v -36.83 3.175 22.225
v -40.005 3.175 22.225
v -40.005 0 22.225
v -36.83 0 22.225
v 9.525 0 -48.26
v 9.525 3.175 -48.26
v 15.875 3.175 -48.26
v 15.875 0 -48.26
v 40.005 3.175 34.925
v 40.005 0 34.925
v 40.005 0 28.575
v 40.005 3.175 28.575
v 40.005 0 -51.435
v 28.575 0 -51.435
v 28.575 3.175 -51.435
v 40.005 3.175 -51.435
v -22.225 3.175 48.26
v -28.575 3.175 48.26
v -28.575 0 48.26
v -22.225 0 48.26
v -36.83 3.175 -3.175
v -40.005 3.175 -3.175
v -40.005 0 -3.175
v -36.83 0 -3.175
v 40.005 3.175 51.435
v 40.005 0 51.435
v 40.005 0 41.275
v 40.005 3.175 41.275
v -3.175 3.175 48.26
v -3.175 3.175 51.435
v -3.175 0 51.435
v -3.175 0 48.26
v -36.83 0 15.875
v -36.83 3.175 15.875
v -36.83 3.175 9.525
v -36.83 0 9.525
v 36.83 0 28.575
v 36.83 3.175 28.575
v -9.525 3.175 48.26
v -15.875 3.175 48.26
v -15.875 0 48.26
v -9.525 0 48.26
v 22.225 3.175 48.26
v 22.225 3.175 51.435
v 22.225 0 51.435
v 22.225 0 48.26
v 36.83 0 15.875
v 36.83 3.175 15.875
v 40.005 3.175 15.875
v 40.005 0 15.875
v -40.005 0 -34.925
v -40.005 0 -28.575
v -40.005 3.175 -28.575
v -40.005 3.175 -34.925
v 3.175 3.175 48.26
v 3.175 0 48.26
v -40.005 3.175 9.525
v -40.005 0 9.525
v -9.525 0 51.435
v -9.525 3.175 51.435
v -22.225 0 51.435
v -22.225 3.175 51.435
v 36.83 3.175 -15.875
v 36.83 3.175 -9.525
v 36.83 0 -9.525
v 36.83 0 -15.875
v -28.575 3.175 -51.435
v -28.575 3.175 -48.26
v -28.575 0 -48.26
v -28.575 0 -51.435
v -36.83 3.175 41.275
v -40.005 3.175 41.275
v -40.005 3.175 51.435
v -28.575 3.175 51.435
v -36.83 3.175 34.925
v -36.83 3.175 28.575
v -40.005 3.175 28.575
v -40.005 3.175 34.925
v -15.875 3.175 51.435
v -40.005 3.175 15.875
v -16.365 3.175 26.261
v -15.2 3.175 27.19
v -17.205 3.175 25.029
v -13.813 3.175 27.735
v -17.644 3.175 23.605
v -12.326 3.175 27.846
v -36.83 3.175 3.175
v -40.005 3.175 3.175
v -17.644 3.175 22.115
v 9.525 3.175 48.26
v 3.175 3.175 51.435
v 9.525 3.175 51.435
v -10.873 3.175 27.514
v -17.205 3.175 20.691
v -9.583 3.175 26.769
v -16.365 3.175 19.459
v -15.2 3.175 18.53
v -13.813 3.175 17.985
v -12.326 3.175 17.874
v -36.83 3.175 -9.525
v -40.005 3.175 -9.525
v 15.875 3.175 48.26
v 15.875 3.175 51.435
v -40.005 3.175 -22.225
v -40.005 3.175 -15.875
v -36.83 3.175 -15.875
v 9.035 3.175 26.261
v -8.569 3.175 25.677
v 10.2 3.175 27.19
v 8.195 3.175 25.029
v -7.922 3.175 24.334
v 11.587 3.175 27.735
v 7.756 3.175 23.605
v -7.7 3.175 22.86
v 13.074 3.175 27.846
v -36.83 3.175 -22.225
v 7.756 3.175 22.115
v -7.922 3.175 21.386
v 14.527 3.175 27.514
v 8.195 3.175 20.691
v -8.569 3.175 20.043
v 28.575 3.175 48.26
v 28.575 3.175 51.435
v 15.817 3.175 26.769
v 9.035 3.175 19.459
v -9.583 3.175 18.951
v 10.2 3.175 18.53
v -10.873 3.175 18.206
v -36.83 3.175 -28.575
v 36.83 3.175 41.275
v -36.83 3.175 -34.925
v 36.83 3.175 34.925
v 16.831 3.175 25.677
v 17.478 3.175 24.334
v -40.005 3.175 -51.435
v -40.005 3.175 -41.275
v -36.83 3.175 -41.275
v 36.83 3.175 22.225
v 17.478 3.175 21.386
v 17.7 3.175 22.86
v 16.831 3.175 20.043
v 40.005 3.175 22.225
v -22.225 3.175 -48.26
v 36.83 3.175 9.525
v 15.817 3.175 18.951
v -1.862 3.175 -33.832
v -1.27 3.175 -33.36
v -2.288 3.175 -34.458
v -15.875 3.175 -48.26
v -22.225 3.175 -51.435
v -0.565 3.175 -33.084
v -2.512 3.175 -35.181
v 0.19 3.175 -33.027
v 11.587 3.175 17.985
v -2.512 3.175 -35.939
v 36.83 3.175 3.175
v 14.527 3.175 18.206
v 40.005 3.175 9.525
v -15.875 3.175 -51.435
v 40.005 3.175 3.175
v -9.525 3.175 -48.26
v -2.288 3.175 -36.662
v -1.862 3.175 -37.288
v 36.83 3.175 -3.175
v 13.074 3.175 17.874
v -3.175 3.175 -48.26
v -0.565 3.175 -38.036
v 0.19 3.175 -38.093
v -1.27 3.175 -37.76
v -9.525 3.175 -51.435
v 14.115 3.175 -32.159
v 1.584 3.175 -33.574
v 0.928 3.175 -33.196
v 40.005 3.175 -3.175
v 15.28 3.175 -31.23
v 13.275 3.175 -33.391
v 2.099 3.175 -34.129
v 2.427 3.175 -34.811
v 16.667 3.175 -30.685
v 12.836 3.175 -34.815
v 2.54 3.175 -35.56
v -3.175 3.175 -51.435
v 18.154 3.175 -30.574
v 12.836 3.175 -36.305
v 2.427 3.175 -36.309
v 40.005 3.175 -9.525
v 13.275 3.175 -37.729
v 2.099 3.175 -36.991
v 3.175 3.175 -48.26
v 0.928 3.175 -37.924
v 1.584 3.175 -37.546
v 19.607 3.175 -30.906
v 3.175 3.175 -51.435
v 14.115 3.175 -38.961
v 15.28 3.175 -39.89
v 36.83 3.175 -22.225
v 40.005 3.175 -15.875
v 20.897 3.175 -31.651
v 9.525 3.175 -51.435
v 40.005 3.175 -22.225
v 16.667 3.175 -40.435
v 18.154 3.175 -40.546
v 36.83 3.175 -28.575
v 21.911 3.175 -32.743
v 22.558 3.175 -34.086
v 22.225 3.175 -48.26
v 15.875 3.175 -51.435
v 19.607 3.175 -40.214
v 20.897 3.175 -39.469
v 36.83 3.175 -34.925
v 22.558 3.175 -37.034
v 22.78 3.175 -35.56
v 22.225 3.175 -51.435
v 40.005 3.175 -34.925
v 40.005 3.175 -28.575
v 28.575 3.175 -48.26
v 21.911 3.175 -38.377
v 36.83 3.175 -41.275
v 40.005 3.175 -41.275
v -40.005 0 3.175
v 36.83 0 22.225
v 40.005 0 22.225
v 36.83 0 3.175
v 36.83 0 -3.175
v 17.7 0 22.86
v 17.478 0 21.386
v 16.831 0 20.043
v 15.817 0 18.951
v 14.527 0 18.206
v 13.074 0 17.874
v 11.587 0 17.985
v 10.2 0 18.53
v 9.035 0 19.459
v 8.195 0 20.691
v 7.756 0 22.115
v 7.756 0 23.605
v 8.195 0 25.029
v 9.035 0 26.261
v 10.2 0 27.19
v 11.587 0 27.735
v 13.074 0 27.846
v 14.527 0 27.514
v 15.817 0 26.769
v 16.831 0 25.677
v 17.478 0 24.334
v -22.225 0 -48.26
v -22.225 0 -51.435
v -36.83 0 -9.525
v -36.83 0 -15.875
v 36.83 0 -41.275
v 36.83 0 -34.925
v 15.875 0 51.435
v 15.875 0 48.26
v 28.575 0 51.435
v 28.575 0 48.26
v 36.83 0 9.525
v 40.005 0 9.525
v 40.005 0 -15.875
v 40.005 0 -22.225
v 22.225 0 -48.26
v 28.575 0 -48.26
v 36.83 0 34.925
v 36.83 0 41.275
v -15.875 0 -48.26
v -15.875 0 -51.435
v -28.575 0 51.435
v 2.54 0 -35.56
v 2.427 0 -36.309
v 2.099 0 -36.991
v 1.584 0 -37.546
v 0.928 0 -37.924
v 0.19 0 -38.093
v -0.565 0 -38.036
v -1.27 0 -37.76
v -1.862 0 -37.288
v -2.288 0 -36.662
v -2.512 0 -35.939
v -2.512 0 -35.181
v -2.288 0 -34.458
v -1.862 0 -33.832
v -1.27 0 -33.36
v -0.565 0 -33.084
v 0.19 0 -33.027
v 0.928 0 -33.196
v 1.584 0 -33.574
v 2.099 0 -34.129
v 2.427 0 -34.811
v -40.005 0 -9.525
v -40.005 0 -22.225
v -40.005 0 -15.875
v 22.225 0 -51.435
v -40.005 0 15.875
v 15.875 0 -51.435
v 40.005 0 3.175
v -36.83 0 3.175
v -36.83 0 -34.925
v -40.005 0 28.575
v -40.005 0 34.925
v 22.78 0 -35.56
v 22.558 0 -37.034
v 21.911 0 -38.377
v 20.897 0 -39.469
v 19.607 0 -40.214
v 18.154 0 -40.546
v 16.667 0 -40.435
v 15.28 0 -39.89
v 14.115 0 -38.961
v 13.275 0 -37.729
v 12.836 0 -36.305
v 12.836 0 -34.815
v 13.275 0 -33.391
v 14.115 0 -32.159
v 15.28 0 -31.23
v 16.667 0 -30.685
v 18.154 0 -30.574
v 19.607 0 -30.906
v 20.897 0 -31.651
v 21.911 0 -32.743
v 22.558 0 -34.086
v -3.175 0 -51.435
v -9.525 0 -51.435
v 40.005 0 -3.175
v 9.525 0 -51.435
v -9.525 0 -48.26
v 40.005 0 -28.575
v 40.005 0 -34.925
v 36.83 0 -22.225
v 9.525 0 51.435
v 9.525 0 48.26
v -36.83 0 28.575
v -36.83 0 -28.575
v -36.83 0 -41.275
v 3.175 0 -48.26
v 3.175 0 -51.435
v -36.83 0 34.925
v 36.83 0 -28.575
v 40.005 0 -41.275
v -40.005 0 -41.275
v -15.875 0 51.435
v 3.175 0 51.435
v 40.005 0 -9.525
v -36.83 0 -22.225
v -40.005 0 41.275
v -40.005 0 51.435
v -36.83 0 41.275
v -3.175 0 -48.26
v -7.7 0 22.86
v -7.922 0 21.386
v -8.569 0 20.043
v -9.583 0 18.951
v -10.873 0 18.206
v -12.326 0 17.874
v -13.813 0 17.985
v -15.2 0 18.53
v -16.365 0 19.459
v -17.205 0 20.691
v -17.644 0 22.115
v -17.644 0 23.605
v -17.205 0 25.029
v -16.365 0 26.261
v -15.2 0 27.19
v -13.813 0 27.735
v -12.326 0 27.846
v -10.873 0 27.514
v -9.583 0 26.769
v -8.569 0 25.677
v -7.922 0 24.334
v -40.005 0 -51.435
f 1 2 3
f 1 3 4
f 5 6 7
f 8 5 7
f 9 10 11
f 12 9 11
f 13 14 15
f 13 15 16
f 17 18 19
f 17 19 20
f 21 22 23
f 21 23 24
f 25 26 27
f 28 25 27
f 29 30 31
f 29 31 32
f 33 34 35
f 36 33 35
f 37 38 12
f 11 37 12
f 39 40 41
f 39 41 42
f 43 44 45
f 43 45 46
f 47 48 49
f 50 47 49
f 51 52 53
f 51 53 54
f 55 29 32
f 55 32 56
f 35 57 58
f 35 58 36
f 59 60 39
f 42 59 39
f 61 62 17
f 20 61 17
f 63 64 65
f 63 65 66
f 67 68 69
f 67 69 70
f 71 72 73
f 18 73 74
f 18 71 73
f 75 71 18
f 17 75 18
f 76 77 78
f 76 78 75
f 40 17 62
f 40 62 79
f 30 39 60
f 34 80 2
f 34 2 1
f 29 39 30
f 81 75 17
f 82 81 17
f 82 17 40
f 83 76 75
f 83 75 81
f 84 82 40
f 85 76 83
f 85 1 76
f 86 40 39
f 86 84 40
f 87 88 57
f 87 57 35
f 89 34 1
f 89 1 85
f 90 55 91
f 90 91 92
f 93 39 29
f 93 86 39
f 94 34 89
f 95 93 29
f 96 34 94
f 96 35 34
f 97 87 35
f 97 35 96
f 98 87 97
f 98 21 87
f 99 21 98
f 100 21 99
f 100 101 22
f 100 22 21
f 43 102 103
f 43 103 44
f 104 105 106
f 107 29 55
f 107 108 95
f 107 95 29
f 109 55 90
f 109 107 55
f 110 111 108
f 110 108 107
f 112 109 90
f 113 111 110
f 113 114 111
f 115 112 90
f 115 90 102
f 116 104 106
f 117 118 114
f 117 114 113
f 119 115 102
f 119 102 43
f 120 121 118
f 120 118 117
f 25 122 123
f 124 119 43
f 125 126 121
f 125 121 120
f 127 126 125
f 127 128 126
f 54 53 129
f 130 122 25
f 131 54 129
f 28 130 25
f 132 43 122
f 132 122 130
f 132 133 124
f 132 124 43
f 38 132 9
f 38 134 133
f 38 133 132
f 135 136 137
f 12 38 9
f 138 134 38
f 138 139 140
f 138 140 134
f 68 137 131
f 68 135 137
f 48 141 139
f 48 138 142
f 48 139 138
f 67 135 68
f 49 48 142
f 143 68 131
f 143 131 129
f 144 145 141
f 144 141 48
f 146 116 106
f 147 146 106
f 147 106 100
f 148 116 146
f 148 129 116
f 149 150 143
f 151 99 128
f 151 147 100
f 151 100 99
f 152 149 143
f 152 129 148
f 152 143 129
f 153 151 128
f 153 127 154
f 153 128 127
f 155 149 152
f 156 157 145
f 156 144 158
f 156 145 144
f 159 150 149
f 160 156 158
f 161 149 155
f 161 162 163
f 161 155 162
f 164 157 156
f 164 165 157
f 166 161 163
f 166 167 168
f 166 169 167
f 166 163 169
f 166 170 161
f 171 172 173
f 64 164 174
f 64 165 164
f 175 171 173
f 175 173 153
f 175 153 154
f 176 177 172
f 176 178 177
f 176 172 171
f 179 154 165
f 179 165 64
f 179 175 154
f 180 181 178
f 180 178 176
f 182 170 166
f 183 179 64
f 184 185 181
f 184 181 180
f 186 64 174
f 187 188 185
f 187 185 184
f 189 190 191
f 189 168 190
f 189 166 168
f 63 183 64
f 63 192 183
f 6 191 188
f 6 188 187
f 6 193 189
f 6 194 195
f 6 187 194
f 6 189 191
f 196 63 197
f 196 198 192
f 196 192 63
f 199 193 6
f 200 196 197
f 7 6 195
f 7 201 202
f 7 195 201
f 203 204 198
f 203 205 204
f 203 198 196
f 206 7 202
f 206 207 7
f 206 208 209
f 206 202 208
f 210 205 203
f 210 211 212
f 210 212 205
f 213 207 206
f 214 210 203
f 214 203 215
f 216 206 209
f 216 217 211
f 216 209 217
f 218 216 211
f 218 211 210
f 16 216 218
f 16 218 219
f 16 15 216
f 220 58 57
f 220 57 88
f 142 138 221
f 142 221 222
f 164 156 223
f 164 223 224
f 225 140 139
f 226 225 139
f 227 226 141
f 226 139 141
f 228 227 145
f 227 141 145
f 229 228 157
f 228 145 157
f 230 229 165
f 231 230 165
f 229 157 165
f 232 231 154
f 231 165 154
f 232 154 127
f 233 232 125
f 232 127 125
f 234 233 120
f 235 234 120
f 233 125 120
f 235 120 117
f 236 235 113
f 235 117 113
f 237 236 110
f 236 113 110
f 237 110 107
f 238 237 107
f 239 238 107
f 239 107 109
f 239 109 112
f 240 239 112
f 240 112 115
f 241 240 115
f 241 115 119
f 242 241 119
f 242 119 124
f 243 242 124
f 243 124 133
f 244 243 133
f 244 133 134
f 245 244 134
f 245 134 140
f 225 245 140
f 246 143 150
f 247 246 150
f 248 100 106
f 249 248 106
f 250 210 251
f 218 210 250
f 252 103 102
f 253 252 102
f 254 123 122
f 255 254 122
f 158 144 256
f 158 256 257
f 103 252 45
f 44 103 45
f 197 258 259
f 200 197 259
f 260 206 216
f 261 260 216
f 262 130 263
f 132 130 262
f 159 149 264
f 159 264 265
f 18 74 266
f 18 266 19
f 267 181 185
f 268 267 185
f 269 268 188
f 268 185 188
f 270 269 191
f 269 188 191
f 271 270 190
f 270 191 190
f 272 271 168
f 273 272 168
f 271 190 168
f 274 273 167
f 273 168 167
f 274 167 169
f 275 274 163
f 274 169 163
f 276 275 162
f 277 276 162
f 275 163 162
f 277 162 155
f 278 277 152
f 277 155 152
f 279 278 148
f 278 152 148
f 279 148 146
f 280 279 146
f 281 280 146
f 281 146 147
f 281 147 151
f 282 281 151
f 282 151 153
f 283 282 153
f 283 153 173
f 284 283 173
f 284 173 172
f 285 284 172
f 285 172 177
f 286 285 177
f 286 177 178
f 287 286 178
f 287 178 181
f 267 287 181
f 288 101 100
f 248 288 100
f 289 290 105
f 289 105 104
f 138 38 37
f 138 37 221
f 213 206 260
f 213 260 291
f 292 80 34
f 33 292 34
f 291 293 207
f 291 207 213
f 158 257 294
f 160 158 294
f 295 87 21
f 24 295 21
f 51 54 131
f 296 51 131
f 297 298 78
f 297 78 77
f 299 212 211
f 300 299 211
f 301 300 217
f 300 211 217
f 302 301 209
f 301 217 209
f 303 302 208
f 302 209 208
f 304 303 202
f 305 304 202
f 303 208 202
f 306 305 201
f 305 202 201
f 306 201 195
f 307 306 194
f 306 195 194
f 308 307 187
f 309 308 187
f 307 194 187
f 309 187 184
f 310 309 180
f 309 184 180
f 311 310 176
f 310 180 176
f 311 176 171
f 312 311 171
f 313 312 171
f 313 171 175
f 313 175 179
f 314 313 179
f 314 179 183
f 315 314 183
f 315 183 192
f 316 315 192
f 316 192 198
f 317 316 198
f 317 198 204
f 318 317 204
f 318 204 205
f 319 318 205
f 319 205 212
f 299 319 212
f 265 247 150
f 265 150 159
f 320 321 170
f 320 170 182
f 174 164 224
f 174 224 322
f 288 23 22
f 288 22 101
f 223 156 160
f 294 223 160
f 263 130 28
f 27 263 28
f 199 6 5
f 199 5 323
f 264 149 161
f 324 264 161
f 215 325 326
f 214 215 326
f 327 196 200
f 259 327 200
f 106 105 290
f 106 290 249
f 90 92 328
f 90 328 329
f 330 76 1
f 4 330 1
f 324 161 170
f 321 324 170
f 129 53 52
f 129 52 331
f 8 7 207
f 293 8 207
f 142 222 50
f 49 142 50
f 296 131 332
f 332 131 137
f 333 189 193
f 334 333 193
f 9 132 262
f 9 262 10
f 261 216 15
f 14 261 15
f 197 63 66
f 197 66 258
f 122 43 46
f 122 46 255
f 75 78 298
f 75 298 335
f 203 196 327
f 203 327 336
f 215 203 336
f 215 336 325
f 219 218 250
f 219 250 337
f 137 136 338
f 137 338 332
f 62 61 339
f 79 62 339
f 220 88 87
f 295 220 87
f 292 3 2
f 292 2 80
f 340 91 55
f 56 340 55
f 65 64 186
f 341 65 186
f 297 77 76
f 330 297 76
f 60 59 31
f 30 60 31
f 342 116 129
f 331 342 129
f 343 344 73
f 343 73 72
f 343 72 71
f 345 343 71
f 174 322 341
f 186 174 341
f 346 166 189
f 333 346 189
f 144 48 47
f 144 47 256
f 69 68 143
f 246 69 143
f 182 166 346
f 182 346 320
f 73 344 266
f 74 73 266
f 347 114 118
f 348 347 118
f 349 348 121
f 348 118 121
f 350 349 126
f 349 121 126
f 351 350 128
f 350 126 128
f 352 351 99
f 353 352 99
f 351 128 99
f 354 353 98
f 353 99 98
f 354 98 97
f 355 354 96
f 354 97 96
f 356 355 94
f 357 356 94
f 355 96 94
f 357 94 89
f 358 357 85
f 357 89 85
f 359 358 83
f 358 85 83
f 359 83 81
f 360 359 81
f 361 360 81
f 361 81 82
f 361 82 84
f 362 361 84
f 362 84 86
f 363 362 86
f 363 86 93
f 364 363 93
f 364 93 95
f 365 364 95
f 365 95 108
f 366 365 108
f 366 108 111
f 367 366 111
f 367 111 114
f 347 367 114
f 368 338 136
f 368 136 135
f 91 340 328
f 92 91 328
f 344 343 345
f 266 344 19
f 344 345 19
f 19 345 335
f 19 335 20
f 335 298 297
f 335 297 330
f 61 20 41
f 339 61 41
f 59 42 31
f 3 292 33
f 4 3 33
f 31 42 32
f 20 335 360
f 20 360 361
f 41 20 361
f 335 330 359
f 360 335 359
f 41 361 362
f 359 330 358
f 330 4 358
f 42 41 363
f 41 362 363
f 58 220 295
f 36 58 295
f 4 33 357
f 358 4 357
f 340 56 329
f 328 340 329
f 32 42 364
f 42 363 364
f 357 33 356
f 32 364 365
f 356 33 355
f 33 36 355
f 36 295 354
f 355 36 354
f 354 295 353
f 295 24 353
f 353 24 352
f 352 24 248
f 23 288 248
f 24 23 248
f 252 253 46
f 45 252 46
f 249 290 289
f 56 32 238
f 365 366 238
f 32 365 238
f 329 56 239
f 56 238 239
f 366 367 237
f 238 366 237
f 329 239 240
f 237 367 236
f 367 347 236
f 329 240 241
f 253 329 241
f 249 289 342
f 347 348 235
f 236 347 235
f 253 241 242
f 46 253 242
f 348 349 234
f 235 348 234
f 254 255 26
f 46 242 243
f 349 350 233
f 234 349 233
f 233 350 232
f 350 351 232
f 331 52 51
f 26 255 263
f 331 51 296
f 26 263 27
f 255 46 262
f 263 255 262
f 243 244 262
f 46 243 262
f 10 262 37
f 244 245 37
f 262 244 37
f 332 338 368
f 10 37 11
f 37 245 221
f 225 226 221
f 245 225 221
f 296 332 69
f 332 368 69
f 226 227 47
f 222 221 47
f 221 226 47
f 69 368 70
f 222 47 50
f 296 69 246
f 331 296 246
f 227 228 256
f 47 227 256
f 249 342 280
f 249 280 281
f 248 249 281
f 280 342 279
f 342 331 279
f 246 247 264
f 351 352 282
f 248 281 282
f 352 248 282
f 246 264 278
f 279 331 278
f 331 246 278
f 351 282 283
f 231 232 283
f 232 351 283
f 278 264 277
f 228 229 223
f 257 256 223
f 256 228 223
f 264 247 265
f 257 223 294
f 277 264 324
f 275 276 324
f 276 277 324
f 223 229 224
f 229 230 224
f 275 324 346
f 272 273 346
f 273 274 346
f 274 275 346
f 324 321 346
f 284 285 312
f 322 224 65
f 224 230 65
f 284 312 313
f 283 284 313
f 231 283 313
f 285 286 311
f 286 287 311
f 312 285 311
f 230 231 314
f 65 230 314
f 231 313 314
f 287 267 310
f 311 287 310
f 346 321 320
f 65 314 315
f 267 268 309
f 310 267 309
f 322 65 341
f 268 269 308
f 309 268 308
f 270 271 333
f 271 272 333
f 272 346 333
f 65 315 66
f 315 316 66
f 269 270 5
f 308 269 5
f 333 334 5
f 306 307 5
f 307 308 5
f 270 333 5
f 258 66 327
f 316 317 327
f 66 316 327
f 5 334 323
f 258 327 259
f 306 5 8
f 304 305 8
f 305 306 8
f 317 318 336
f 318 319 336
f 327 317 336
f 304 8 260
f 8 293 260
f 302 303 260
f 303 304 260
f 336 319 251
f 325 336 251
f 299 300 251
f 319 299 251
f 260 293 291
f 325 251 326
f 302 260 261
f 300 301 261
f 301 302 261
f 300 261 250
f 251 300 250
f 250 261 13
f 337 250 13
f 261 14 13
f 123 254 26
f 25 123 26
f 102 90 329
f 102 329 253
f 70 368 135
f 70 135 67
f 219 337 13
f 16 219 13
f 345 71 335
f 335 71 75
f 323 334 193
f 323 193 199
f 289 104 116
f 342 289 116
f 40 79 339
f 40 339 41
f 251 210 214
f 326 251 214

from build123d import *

# Parameters (mm, degrees)
SKETCH1_W           = 80.01
SKETCH1_H           = 102.87
BOSS_EXTRUDE1_DEPTH = 3.175
SKETCH2_W           = 3.175
SKETCH2_H           = 6.35
CUT_EXTRUDE1_DEPTH  = 4.175
SKETCH3_W           = 6.35
SKETCH3_H           = 3.175
CUT_EXTRUDE2_DEPTH  = 4.175
SKETCH4_R           = 2.54
SKETCH4_R_2         = 5
CUT_EXTRUDE3_DEPTH  = 4.175


with BuildPart() as part:
    # Sketch1 → Boss-Extrude1 (new body)
    with BuildSketch(Plane(origin=(0, 0, 0), x_dir=(1, 0, 0), z_dir=(0, 1, 0))):
        Rectangle(SKETCH1_W, SKETCH1_H)
    extrude(amount=BOSS_EXTRUDE1_DEPTH)

    # Sketch2 → Cut-Extrude1 (cut, through all)
    with BuildSketch(Plane(origin=(0, 3.175, 0), x_dir=(1, 0, 0), z_dir=(0, 1, 0))):
        with Locations((-38.4175, -38.1)):
            Rectangle(SKETCH2_W, SKETCH2_H)
        with Locations((-38.4175, -25.4)):
            Rectangle(SKETCH2_W, SKETCH2_H)
        with Locations((-38.4175, -12.7)):
            Rectangle(SKETCH2_W, SKETCH2_H)
        with Locations((-38.4175, 0)):
            Rectangle(SKETCH2_W, SKETCH2_H)
        with Locations((-38.4175, 12.7)):
            Rectangle(SKETCH2_W, SKETCH2_H)
        with Locations((-38.4175, 25.4)):
            Rectangle(SKETCH2_W, SKETCH2_H)
        with Locations((38.4175, 25.4)):
            Rectangle(SKETCH2_W, SKETCH2_H)
        with Locations((38.4175, 12.7)):
            Rectangle(SKETCH2_W, SKETCH2_H)
        with Locations((38.4175, 0)):
            Rectangle(SKETCH2_W, SKETCH2_H)
        with Locations((38.4175, -12.7)):
            Rectangle(SKETCH2_W, SKETCH2_H)
        with Locations((38.4175, -25.4)):
            Rectangle(SKETCH2_W, SKETCH2_H)
        with Locations((38.4175, -38.1)):
            Rectangle(SKETCH2_W, SKETCH2_H)
        with Locations((-38.4175, 38.1)):
            Rectangle(SKETCH2_W, SKETCH2_H)
        with Locations((38.4175, 38.1)):
            Rectangle(SKETCH2_W, SKETCH2_H)
    extrude(amount=-CUT_EXTRUDE1_DEPTH, mode=Mode.SUBTRACT)

    # Sketch3 → Cut-Extrude2 (cut, through all)
    with BuildSketch(Plane(origin=(0, 3.175, 0), x_dir=(1, 0, 0), z_dir=(0, 1, 0))):
        with Locations((25.4, 49.8475)):
            Rectangle(SKETCH3_W, SKETCH3_H)
        with Locations((12.7, 49.8475)):
            Rectangle(SKETCH3_W, SKETCH3_H)
        with Locations((0, 49.8475)):
            Rectangle(SKETCH3_W, SKETCH3_H)
        with Locations((-12.7, 49.8475)):
            Rectangle(SKETCH3_W, SKETCH3_H)
        with Locations((-12.7, -49.8475)):
            Rectangle(SKETCH3_W, SKETCH3_H)
        with Locations((0, -49.8475)):
            Rectangle(SKETCH3_W, SKETCH3_H)
        with Locations((12.7, -49.8475)):
            Rectangle(SKETCH3_W, SKETCH3_H)
        with Locations((25.4, -49.8475)):
            Rectangle(SKETCH3_W, SKETCH3_H)
        with Locations((-25.4, -49.8475)):
            Rectangle(SKETCH3_W, SKETCH3_H)
        with Locations((-25.4, 49.8475)):
            Rectangle(SKETCH3_W, SKETCH3_H)
    extrude(amount=-CUT_EXTRUDE2_DEPTH, mode=Mode.SUBTRACT)

    # Sketch4 → Cut-Extrude3 (cut, through all)
    with BuildSketch(Plane(origin=(0, 3.175, 0), x_dir=(1, 0, 0), z_dir=(0, 1, 0))):
        with Locations((0, 35.56)):
            Circle(SKETCH4_R)
        with Locations((17.78, 35.56)):
            Circle(SKETCH4_R_2)
        with Locations((12.7, -22.86)):
            Circle(SKETCH4_R_2)
        with Locations((-12.7, -22.86)):
            Circle(SKETCH4_R_2)
    extrude(amount=-CUT_EXTRUDE3_DEPTH, mode=Mode.SUBTRACT)


solid = part.part
